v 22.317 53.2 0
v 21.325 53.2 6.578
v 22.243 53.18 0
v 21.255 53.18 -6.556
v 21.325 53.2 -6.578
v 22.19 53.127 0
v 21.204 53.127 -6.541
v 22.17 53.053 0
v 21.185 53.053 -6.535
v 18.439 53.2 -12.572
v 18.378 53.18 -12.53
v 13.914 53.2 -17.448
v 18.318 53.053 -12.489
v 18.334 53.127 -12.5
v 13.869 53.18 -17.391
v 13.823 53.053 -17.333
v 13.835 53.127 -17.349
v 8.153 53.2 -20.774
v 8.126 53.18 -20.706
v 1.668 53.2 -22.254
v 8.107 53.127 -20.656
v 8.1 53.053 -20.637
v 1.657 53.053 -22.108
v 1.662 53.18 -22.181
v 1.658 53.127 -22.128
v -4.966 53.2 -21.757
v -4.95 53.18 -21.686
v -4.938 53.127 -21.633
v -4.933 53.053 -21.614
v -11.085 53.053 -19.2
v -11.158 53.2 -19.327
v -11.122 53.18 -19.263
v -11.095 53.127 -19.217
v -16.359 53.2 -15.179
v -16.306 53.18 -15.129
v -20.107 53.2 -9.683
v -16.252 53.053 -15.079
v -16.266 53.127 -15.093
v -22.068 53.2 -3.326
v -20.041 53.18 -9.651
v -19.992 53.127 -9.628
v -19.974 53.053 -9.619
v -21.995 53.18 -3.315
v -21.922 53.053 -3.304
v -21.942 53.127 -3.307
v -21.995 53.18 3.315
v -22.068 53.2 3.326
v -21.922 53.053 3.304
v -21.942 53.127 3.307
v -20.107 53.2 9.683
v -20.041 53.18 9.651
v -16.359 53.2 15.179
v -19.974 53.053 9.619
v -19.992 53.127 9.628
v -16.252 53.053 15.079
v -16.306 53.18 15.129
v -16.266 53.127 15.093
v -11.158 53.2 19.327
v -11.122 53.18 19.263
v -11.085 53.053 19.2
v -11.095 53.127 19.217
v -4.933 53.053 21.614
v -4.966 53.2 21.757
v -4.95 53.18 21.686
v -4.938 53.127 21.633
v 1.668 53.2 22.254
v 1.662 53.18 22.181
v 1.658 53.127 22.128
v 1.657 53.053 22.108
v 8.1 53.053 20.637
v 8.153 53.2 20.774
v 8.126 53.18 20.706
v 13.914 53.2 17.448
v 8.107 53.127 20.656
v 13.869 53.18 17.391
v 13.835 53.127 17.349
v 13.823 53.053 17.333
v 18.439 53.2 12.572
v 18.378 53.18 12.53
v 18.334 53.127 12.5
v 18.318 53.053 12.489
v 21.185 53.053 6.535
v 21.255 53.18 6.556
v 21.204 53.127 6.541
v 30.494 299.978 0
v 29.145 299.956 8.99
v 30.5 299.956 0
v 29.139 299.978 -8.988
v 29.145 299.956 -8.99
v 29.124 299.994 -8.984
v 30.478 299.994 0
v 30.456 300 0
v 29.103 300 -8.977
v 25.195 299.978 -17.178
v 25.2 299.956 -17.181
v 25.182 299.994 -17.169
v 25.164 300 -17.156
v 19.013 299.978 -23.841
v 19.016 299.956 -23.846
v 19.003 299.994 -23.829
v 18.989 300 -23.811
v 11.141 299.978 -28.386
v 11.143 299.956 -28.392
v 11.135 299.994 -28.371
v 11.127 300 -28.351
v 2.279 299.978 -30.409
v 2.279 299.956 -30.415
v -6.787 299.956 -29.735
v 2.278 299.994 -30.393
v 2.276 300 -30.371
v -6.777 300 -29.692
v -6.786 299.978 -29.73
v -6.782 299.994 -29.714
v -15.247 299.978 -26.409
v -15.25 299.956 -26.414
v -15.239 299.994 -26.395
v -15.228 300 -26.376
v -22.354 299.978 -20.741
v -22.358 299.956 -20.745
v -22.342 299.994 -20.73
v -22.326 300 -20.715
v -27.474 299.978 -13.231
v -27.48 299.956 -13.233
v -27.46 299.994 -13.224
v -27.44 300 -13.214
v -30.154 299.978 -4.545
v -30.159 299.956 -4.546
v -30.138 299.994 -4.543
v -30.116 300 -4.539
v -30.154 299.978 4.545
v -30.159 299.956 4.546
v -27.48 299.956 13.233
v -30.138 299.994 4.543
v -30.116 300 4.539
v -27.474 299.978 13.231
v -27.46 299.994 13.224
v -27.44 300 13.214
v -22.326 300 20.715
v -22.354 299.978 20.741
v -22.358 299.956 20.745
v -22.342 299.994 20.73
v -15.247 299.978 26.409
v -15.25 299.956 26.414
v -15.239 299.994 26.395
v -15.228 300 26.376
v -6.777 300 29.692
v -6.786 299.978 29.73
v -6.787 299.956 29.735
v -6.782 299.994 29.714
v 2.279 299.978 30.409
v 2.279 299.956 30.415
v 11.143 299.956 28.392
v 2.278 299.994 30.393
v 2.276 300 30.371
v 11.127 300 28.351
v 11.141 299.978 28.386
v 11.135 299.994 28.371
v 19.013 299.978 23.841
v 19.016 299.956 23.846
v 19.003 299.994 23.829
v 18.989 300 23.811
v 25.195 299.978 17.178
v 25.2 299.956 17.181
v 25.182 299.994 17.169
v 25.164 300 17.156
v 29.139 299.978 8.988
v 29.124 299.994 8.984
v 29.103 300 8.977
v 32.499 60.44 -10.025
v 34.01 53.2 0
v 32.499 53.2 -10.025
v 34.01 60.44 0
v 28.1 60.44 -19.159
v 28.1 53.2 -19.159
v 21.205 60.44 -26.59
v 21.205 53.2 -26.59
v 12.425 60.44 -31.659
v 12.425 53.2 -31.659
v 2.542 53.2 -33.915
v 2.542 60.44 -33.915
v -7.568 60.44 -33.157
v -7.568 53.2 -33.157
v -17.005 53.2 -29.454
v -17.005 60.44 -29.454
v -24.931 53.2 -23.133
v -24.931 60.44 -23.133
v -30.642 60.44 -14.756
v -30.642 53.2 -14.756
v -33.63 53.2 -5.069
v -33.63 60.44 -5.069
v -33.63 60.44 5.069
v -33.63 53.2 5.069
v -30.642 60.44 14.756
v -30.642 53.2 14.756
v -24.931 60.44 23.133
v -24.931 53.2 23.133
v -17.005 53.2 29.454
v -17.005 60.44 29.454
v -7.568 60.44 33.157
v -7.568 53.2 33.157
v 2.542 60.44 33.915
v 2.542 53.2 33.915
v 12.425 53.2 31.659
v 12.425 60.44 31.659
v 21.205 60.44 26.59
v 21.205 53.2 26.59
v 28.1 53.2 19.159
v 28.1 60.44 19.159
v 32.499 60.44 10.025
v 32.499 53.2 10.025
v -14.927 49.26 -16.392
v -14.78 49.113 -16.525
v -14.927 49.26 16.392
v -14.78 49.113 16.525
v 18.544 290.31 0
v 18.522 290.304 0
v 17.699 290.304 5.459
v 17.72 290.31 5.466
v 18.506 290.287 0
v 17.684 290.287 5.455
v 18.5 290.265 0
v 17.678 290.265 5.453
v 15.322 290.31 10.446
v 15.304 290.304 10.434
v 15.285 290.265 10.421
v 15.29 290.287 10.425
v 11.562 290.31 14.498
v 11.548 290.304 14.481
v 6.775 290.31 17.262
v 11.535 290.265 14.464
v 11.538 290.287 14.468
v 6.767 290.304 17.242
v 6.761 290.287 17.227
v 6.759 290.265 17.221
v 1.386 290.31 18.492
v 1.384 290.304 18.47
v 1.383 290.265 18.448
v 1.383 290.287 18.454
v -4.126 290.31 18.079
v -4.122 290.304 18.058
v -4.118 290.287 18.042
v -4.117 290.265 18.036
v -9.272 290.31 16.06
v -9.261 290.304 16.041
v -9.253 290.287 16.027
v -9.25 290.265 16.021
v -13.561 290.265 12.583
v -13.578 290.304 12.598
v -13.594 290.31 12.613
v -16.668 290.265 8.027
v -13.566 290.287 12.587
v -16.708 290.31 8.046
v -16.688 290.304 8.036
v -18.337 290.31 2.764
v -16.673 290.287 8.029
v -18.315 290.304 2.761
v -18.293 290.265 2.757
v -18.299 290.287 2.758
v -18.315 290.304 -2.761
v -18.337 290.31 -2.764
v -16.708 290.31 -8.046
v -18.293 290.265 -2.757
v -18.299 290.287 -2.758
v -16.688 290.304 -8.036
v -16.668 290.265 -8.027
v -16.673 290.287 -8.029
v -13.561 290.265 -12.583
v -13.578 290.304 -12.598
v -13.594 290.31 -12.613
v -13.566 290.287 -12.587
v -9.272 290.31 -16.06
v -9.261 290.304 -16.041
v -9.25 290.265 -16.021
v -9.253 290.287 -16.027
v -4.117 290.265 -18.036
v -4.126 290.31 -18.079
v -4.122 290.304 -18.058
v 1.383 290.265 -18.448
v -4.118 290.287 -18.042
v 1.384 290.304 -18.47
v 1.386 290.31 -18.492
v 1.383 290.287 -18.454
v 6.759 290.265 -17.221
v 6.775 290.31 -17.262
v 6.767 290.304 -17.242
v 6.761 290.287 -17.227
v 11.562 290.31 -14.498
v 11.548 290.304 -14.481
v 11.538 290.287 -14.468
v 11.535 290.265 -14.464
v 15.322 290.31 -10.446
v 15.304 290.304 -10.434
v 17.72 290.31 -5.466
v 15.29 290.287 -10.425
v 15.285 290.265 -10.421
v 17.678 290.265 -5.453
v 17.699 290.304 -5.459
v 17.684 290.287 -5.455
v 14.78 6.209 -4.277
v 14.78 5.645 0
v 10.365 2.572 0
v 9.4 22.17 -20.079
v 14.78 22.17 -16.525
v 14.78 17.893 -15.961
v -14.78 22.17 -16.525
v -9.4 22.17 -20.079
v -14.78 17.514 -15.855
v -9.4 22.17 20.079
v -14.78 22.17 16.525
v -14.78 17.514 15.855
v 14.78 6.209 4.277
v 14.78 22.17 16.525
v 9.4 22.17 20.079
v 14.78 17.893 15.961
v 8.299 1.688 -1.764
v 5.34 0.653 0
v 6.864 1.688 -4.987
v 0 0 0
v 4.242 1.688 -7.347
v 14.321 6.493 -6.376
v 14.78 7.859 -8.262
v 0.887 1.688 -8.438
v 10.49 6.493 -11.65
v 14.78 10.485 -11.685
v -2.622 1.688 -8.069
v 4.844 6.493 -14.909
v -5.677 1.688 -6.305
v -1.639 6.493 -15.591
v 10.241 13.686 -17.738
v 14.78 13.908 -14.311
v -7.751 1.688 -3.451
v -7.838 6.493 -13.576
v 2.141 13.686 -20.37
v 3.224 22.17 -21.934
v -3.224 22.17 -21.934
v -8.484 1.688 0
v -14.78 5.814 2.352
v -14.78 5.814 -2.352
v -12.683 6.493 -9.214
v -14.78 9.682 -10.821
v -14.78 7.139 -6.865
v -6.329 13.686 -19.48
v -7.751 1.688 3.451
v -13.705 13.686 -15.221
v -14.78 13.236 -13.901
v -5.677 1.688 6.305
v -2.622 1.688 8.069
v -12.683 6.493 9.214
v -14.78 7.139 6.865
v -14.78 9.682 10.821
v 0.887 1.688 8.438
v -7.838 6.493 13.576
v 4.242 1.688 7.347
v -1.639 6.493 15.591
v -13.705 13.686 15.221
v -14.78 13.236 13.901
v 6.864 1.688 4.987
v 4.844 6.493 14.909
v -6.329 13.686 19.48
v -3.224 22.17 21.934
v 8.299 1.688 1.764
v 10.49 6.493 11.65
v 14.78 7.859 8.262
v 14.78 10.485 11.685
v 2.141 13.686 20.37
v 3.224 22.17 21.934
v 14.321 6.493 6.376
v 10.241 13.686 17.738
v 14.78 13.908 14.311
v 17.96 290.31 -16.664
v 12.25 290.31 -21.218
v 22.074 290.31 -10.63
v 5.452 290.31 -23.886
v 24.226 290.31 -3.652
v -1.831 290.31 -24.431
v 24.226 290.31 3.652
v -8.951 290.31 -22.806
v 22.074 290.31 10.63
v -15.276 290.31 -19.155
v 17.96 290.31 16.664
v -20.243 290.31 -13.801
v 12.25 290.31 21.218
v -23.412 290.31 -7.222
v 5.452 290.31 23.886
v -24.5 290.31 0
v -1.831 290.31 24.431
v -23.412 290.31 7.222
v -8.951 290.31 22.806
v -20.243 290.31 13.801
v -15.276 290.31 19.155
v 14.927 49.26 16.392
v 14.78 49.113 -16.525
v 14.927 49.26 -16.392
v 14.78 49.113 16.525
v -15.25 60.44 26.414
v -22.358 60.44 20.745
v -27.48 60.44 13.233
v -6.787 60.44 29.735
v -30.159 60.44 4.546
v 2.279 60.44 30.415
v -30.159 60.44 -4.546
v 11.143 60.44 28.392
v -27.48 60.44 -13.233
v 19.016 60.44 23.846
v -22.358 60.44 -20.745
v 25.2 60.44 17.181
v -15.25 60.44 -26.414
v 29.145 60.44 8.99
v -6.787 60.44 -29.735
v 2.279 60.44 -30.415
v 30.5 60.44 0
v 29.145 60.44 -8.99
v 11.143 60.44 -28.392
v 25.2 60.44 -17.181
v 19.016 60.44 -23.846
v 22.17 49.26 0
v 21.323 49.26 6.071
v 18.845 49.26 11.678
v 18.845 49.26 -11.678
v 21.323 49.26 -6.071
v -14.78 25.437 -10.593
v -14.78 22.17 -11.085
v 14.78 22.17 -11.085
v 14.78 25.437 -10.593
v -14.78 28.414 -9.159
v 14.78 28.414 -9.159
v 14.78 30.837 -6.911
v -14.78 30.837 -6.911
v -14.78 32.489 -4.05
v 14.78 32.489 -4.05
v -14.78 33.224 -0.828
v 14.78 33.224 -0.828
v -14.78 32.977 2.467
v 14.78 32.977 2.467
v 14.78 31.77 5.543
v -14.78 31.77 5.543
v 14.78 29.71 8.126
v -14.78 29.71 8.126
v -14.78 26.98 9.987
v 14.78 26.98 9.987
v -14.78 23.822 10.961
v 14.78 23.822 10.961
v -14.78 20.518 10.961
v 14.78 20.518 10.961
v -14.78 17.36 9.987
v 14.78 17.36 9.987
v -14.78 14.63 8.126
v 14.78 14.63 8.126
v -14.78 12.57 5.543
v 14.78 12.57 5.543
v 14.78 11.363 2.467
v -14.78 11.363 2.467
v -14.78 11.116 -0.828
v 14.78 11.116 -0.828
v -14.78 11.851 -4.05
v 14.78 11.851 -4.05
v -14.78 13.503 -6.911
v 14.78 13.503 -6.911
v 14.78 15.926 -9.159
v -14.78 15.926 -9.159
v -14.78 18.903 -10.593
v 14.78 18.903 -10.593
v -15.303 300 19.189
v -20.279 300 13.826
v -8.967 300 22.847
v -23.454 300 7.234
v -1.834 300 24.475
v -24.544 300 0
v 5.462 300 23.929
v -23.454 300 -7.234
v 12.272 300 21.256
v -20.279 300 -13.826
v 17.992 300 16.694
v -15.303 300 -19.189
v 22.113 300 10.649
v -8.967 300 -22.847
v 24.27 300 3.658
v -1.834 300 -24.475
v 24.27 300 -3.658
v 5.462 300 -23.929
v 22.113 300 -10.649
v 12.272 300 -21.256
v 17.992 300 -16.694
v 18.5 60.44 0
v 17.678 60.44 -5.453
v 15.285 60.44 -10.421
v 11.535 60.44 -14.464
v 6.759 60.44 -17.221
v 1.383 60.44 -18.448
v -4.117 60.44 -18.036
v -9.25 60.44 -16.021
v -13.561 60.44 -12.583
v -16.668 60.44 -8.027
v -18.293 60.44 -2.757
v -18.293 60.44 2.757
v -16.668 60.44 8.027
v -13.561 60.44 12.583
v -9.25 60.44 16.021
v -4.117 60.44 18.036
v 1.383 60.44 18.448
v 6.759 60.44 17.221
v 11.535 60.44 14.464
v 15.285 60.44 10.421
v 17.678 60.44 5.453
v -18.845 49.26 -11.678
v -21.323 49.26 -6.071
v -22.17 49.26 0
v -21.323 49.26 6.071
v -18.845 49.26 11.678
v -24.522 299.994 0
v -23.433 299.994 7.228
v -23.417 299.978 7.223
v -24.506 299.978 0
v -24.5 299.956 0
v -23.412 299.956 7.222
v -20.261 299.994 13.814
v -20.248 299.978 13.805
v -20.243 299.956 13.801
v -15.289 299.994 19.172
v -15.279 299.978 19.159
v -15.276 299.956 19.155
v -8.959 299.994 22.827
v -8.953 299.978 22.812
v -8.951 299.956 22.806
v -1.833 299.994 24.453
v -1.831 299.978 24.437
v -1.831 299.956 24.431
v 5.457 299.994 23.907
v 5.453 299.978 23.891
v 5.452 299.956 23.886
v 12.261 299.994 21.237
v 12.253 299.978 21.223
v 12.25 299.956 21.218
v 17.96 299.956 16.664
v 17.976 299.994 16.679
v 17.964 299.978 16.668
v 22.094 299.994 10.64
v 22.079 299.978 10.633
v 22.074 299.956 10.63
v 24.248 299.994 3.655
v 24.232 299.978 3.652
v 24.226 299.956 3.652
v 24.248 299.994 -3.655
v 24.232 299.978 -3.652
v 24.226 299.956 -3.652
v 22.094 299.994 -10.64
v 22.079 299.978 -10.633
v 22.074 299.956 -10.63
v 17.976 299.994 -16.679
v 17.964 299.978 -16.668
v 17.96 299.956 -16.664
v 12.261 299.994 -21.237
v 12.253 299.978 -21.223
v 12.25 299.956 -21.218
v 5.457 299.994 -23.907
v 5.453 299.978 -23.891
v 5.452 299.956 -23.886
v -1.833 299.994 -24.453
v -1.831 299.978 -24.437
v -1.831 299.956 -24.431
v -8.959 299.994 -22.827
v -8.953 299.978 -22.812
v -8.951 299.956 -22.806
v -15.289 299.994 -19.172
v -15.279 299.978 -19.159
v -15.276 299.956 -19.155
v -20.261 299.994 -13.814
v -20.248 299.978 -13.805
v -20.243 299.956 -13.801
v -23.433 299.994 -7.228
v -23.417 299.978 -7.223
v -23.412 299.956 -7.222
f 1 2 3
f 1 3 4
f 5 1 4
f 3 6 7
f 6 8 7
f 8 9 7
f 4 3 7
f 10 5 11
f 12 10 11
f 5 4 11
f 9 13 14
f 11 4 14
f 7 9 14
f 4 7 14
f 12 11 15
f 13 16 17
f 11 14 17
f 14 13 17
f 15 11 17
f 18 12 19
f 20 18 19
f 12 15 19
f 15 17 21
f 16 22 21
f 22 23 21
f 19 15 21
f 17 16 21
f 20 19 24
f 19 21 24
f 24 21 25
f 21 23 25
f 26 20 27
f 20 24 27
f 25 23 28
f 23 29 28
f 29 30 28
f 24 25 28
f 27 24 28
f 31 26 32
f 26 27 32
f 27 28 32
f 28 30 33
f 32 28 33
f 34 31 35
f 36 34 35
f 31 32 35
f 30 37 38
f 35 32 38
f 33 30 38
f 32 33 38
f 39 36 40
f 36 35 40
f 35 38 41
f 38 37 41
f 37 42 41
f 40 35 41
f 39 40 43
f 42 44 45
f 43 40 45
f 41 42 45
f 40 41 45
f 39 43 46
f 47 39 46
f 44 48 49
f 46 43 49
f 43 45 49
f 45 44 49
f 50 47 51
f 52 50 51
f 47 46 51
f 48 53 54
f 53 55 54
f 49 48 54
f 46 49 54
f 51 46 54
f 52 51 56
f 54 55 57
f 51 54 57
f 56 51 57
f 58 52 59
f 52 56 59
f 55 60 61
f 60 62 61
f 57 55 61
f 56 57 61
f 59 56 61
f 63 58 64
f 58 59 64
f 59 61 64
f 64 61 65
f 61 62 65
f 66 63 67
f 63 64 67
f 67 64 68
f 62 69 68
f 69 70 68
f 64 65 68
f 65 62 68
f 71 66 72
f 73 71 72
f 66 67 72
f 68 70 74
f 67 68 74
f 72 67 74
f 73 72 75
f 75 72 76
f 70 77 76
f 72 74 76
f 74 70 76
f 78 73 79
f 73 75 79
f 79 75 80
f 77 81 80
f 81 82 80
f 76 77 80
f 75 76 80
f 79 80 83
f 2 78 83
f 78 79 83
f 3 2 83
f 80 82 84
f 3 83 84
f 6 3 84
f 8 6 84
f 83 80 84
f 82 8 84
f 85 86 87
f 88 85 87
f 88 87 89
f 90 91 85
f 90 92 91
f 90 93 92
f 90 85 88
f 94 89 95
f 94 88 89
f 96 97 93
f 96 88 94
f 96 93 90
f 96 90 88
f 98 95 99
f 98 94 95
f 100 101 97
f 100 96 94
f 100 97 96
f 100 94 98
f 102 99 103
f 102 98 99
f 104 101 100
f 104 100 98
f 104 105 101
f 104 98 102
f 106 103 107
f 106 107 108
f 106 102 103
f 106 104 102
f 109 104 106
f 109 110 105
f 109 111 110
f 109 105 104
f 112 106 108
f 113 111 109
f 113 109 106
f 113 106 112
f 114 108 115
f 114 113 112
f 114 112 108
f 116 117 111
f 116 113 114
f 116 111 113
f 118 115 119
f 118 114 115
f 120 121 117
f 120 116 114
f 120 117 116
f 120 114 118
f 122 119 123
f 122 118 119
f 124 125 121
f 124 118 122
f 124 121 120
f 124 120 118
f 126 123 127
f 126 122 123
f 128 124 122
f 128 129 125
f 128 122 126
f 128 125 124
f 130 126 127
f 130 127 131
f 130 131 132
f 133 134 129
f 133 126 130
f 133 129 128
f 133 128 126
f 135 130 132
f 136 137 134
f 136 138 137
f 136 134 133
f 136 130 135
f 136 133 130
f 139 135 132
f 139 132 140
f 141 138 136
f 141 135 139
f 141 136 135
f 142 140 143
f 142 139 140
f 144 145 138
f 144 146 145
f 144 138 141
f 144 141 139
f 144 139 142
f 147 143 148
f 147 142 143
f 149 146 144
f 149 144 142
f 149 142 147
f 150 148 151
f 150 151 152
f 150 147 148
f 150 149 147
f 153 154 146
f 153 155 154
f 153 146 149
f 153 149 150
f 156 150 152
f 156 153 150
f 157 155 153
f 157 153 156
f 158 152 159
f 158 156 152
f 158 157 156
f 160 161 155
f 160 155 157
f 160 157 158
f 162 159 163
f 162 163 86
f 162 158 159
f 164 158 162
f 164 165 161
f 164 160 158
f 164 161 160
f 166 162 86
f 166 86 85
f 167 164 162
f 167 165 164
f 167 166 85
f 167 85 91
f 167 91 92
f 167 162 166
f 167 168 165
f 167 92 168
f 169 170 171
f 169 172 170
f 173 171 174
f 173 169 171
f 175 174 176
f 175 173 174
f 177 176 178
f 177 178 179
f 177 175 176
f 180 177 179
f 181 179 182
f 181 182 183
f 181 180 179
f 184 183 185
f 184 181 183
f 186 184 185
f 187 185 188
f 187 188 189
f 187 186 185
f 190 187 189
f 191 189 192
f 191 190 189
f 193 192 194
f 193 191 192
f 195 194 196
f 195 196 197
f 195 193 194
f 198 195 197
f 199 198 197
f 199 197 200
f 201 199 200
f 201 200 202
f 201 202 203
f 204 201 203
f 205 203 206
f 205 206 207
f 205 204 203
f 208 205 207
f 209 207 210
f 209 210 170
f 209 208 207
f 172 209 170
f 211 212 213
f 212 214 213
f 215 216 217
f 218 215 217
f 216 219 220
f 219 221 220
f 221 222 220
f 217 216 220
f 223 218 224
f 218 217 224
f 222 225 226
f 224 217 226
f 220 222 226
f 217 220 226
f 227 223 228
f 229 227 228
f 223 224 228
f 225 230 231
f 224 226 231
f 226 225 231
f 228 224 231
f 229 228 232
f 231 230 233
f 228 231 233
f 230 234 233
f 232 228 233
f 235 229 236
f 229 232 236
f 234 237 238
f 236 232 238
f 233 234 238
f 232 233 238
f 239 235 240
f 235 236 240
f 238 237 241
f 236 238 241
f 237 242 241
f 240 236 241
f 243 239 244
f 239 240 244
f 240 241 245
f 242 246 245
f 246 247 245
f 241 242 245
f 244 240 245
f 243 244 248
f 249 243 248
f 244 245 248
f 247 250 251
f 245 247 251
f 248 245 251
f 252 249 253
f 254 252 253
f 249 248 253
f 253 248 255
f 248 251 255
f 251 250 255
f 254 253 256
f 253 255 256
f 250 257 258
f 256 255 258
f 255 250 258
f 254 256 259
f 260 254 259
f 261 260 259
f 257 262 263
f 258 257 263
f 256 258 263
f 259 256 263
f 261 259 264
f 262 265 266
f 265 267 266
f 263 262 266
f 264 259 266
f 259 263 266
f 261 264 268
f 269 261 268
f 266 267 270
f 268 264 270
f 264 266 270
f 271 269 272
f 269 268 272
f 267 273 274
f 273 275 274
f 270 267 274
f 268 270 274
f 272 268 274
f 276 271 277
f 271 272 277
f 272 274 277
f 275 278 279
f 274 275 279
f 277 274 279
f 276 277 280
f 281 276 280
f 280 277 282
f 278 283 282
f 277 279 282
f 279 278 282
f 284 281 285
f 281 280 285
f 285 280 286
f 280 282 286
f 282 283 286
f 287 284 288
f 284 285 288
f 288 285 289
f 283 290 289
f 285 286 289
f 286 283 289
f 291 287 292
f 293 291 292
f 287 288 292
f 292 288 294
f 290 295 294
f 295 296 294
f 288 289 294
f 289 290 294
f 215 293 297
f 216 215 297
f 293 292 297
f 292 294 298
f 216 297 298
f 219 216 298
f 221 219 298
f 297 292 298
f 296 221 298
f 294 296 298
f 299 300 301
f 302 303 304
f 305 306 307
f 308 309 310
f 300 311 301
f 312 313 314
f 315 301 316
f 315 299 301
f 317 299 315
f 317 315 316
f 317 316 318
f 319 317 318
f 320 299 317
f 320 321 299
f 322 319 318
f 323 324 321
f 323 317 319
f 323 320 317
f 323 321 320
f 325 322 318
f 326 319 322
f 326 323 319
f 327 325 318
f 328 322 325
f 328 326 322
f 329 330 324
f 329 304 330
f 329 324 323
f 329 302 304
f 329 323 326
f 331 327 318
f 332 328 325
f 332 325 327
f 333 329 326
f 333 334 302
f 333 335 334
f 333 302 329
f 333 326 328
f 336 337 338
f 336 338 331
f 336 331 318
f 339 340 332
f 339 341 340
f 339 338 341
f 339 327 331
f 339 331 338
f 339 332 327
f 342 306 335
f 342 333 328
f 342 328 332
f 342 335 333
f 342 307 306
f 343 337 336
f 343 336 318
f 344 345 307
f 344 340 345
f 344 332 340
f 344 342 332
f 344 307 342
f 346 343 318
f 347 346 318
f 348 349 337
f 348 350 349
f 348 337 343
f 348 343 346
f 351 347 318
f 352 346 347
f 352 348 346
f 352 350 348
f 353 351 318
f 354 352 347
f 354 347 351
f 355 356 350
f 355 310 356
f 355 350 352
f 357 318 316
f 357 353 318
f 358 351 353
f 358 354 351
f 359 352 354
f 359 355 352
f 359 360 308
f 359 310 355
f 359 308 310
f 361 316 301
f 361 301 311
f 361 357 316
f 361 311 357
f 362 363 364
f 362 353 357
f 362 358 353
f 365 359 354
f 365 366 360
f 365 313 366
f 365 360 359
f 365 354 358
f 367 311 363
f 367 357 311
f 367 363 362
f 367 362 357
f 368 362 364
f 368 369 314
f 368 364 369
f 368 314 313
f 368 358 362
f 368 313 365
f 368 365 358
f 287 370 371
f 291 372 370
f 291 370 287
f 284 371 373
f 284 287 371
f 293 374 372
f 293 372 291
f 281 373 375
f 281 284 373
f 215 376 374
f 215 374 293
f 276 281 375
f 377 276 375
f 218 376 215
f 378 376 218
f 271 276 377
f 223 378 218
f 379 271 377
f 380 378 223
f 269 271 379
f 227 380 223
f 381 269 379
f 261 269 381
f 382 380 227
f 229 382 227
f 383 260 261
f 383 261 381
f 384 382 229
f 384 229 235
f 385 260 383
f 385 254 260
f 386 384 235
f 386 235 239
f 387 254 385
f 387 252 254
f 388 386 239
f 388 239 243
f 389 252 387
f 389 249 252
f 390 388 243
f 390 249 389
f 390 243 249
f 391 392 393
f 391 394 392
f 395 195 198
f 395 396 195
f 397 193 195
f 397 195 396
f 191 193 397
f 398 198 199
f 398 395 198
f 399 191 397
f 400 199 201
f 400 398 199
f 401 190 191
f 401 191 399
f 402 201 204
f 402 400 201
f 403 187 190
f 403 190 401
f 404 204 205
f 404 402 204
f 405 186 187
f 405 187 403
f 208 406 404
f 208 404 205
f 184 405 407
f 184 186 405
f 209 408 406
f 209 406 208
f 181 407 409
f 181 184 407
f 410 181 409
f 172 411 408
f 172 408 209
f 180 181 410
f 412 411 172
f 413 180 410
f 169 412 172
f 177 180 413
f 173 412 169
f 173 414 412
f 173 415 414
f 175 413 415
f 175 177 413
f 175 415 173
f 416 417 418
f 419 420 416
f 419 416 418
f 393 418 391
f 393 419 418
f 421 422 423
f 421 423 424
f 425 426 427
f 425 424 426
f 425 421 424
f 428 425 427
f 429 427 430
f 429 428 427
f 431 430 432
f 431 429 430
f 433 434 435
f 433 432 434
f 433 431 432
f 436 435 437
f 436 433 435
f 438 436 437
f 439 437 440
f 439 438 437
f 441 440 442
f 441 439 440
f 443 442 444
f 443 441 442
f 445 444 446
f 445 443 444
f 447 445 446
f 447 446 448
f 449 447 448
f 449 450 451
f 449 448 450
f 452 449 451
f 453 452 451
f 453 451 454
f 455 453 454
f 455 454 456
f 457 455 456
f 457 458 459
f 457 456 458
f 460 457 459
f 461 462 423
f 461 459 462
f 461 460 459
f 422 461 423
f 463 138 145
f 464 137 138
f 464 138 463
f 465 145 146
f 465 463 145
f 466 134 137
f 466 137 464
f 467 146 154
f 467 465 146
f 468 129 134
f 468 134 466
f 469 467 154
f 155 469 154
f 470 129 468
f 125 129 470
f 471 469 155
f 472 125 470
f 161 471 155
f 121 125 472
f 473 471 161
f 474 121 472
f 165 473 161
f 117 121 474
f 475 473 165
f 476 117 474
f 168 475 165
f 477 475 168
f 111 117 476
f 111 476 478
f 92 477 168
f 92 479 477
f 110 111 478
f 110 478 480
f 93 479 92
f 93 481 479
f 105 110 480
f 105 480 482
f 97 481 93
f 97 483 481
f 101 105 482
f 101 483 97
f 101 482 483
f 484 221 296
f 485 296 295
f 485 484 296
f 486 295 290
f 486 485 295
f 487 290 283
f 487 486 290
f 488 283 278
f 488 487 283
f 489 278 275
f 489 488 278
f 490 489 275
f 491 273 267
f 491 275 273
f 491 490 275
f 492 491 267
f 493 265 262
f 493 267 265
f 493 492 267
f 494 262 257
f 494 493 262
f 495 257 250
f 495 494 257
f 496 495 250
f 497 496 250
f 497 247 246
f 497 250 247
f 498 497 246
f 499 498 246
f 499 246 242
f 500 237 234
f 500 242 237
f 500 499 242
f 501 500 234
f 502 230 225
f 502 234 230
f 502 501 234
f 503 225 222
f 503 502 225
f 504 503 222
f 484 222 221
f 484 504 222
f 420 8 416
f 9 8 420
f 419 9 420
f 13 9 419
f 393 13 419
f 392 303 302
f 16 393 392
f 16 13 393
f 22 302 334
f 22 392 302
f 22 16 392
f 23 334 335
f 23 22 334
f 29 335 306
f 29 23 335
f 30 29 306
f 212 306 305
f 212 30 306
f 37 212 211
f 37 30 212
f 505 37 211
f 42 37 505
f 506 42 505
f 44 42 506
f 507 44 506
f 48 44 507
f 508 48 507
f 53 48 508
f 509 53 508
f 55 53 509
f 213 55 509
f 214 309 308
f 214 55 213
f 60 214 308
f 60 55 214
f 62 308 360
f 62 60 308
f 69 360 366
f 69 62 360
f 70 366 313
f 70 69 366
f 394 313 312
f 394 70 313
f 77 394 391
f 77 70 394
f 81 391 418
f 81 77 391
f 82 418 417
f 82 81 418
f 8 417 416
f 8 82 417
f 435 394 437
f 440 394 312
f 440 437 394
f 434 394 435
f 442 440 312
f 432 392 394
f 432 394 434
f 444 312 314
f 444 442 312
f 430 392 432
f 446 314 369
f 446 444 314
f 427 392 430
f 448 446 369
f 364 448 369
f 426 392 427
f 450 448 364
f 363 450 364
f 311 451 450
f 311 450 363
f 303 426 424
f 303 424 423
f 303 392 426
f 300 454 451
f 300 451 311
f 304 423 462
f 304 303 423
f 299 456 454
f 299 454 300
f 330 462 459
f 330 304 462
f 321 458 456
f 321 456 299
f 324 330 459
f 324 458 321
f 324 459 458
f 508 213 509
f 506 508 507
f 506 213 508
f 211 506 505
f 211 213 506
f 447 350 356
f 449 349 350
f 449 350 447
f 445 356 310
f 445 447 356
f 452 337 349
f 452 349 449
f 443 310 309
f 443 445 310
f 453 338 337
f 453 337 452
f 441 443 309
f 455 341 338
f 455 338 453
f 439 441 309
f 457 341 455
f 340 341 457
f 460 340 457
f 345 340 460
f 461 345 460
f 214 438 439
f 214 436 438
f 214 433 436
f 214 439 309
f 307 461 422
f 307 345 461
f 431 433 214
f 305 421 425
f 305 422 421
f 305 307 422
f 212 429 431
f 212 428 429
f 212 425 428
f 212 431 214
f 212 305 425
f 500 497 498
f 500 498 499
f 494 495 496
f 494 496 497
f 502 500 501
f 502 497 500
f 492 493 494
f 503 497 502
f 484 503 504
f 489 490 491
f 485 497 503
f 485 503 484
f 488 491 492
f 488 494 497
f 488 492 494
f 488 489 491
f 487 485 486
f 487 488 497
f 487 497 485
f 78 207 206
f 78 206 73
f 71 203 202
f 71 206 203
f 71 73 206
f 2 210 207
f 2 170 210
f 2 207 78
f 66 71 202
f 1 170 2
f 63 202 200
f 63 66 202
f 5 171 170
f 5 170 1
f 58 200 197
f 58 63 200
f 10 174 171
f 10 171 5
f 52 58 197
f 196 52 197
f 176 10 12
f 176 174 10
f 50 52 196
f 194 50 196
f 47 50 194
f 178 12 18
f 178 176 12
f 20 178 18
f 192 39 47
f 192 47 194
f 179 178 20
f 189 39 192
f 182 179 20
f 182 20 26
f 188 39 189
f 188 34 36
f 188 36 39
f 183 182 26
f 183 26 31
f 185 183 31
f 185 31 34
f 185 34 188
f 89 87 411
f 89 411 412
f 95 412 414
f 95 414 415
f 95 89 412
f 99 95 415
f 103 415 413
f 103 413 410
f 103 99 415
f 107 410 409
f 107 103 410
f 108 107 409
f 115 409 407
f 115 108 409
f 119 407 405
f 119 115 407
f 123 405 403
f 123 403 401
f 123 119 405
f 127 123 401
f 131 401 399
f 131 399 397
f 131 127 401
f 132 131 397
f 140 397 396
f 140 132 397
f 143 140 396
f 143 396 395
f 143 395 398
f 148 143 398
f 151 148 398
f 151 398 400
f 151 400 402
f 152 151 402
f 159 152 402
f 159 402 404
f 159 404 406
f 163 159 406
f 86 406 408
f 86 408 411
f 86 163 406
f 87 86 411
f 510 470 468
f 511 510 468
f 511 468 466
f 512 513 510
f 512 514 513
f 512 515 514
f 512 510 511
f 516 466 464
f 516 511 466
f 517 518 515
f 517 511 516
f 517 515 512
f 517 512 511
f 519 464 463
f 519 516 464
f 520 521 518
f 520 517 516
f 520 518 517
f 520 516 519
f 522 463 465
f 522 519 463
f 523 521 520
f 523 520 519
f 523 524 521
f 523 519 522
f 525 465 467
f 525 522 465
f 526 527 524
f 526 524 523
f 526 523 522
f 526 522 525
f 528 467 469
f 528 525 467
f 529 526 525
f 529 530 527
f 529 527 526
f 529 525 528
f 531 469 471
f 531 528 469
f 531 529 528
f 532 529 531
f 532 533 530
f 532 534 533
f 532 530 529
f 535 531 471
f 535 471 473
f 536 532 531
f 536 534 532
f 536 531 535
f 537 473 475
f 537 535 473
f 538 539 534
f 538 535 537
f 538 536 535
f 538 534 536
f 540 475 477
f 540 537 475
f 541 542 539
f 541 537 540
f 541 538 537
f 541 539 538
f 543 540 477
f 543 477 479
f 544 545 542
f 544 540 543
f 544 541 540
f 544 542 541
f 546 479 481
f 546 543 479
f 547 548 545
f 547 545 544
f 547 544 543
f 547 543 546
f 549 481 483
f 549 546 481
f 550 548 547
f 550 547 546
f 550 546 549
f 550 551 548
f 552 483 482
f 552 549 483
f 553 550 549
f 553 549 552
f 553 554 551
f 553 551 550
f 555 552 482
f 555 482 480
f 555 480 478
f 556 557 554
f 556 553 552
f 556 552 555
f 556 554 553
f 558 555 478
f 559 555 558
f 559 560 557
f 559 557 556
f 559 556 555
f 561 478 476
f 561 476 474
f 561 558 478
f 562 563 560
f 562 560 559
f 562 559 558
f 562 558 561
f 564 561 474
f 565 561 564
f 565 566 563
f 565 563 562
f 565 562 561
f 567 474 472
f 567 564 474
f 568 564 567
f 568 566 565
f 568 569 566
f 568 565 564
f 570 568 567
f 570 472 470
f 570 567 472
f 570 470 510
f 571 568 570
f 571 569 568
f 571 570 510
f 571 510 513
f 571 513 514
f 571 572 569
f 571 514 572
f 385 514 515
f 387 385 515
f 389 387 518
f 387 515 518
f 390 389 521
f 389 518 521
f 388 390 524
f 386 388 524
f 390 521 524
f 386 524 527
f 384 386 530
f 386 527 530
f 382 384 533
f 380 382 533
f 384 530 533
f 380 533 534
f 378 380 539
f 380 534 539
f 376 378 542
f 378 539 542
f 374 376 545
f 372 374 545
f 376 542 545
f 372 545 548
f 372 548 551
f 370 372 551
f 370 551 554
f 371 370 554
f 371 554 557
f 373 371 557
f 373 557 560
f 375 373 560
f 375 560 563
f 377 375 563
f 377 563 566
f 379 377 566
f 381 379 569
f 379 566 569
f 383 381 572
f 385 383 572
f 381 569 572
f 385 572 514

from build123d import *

# Parameters (mm, degrees)
CUT_EXTRUDE1_DEPTH      = 304.831137641
CUT_EXTRUDE1_DEPTH_BACK = 304.831137641
SKETCH2_R               = 11.085
CUT_EXTRUDE2_DEPTH      = 304.831137641
CUT_EXTRUDE2_DEPTH_BACK = 304.831137641
FILLET1_R               = 0.146825397
SKETCH8_R               = 24.5
CUT_EXTRUDE3_DEPTH      = 9.690476191
FILLET4_R               = 0.044047619


with BuildPart() as part:
    # Sketch1 → Revolve1 (revolve)
    with BuildSketch(Plane.XY):
        with BuildLine():
            Line((34.01, 60.44), (30.5, 60.44))
            Line((30.5, 60.44), (30.5, 300))
            Line((30.5, 300), (18.5, 300))
            Line((18.5, 300), (18.5, 60.44))
            Line((18.5, 60.44), (0, 60.44))
            Line((0, 60.44), (0, 0))
            ThreePointArc((0, 0), (15.676557339, 6.493442661), (22.17, 22.17))
            Line((22.17, 22.17), (22.17, 53.2))
            Line((22.17, 53.2), (34.01, 53.2))
            Line((34.01, 53.2), (34.01, 60.44))
        make_face()
    revolve(axis=Axis((0, 0, 0), (0, 1, 0)))

    # Sketch2 → Cut-Extrude1 (cut, two sides: drawn at the far end of the back side and taken through both)
    with BuildSketch(Plane(origin=(0, 0, 0), x_dir=(0, 0, -1), z_dir=(1, 0, 0)).offset(-CUT_EXTRUDE1_DEPTH_BACK)):
        with Locations((0, 22.17)):
            Circle(SKETCH2_R)
    extrude(amount=CUT_EXTRUDE1_DEPTH + CUT_EXTRUDE1_DEPTH_BACK, mode=Mode.SUBTRACT)

    # Sketch3 → Cut-Extrude2 (cut, two sides: drawn at the far end of the back side and taken through both)
    with BuildSketch(Plane.XY.offset(-CUT_EXTRUDE2_DEPTH_BACK)):
        Polygon((-53.33, 49.26), (-53.33, 0), (-14.78, 0), (-14.78, 28.148148148), (-14.78, 49.26), (-35.888888889, 49.26), align=None)
        Polygon((35.888888889, 49.26), (53.33, 49.26), (53.33, 0), (14.78, 0), (14.78, 28.148148148), (14.78, 49.26), align=None)
    extrude(amount=CUT_EXTRUDE2_DEPTH + CUT_EXTRUDE2_DEPTH_BACK, mode=Mode.SUBTRACT)

    # Fillet1
    fillet1_edges = [part.edges().sort_by_distance(p)[0] for p in [
        (-22.17, 53.2, 0),
        (14.78, 49.26, 0),
        (-14.78, 49.26, 0),
    ]]
    fillet(fillet1_edges, radius=FILLET1_R)

    # Sketch8 → Cut-Extrude3 (cut)
    with BuildSketch(Plane(origin=(0, 300, 0), x_dir=(1, 0, 0), z_dir=(0, 1, 0))):
        with Locations(Location((0, 0, 0), (0, 0, 180))):
            Circle(SKETCH8_R)
    extrude(amount=-CUT_EXTRUDE3_DEPTH, mode=Mode.SUBTRACT)

    # Fillet4
    fillet4_edges = [part.edges().sort_by_distance(p)[0] for p in [
        (-18.5, 290.309523809, 0),
        (24.5, 300, 0),
        (-30.5, 300, 0),
    ]]
    fillet(fillet4_edges, radius=FILLET4_R)


solid = part.part
